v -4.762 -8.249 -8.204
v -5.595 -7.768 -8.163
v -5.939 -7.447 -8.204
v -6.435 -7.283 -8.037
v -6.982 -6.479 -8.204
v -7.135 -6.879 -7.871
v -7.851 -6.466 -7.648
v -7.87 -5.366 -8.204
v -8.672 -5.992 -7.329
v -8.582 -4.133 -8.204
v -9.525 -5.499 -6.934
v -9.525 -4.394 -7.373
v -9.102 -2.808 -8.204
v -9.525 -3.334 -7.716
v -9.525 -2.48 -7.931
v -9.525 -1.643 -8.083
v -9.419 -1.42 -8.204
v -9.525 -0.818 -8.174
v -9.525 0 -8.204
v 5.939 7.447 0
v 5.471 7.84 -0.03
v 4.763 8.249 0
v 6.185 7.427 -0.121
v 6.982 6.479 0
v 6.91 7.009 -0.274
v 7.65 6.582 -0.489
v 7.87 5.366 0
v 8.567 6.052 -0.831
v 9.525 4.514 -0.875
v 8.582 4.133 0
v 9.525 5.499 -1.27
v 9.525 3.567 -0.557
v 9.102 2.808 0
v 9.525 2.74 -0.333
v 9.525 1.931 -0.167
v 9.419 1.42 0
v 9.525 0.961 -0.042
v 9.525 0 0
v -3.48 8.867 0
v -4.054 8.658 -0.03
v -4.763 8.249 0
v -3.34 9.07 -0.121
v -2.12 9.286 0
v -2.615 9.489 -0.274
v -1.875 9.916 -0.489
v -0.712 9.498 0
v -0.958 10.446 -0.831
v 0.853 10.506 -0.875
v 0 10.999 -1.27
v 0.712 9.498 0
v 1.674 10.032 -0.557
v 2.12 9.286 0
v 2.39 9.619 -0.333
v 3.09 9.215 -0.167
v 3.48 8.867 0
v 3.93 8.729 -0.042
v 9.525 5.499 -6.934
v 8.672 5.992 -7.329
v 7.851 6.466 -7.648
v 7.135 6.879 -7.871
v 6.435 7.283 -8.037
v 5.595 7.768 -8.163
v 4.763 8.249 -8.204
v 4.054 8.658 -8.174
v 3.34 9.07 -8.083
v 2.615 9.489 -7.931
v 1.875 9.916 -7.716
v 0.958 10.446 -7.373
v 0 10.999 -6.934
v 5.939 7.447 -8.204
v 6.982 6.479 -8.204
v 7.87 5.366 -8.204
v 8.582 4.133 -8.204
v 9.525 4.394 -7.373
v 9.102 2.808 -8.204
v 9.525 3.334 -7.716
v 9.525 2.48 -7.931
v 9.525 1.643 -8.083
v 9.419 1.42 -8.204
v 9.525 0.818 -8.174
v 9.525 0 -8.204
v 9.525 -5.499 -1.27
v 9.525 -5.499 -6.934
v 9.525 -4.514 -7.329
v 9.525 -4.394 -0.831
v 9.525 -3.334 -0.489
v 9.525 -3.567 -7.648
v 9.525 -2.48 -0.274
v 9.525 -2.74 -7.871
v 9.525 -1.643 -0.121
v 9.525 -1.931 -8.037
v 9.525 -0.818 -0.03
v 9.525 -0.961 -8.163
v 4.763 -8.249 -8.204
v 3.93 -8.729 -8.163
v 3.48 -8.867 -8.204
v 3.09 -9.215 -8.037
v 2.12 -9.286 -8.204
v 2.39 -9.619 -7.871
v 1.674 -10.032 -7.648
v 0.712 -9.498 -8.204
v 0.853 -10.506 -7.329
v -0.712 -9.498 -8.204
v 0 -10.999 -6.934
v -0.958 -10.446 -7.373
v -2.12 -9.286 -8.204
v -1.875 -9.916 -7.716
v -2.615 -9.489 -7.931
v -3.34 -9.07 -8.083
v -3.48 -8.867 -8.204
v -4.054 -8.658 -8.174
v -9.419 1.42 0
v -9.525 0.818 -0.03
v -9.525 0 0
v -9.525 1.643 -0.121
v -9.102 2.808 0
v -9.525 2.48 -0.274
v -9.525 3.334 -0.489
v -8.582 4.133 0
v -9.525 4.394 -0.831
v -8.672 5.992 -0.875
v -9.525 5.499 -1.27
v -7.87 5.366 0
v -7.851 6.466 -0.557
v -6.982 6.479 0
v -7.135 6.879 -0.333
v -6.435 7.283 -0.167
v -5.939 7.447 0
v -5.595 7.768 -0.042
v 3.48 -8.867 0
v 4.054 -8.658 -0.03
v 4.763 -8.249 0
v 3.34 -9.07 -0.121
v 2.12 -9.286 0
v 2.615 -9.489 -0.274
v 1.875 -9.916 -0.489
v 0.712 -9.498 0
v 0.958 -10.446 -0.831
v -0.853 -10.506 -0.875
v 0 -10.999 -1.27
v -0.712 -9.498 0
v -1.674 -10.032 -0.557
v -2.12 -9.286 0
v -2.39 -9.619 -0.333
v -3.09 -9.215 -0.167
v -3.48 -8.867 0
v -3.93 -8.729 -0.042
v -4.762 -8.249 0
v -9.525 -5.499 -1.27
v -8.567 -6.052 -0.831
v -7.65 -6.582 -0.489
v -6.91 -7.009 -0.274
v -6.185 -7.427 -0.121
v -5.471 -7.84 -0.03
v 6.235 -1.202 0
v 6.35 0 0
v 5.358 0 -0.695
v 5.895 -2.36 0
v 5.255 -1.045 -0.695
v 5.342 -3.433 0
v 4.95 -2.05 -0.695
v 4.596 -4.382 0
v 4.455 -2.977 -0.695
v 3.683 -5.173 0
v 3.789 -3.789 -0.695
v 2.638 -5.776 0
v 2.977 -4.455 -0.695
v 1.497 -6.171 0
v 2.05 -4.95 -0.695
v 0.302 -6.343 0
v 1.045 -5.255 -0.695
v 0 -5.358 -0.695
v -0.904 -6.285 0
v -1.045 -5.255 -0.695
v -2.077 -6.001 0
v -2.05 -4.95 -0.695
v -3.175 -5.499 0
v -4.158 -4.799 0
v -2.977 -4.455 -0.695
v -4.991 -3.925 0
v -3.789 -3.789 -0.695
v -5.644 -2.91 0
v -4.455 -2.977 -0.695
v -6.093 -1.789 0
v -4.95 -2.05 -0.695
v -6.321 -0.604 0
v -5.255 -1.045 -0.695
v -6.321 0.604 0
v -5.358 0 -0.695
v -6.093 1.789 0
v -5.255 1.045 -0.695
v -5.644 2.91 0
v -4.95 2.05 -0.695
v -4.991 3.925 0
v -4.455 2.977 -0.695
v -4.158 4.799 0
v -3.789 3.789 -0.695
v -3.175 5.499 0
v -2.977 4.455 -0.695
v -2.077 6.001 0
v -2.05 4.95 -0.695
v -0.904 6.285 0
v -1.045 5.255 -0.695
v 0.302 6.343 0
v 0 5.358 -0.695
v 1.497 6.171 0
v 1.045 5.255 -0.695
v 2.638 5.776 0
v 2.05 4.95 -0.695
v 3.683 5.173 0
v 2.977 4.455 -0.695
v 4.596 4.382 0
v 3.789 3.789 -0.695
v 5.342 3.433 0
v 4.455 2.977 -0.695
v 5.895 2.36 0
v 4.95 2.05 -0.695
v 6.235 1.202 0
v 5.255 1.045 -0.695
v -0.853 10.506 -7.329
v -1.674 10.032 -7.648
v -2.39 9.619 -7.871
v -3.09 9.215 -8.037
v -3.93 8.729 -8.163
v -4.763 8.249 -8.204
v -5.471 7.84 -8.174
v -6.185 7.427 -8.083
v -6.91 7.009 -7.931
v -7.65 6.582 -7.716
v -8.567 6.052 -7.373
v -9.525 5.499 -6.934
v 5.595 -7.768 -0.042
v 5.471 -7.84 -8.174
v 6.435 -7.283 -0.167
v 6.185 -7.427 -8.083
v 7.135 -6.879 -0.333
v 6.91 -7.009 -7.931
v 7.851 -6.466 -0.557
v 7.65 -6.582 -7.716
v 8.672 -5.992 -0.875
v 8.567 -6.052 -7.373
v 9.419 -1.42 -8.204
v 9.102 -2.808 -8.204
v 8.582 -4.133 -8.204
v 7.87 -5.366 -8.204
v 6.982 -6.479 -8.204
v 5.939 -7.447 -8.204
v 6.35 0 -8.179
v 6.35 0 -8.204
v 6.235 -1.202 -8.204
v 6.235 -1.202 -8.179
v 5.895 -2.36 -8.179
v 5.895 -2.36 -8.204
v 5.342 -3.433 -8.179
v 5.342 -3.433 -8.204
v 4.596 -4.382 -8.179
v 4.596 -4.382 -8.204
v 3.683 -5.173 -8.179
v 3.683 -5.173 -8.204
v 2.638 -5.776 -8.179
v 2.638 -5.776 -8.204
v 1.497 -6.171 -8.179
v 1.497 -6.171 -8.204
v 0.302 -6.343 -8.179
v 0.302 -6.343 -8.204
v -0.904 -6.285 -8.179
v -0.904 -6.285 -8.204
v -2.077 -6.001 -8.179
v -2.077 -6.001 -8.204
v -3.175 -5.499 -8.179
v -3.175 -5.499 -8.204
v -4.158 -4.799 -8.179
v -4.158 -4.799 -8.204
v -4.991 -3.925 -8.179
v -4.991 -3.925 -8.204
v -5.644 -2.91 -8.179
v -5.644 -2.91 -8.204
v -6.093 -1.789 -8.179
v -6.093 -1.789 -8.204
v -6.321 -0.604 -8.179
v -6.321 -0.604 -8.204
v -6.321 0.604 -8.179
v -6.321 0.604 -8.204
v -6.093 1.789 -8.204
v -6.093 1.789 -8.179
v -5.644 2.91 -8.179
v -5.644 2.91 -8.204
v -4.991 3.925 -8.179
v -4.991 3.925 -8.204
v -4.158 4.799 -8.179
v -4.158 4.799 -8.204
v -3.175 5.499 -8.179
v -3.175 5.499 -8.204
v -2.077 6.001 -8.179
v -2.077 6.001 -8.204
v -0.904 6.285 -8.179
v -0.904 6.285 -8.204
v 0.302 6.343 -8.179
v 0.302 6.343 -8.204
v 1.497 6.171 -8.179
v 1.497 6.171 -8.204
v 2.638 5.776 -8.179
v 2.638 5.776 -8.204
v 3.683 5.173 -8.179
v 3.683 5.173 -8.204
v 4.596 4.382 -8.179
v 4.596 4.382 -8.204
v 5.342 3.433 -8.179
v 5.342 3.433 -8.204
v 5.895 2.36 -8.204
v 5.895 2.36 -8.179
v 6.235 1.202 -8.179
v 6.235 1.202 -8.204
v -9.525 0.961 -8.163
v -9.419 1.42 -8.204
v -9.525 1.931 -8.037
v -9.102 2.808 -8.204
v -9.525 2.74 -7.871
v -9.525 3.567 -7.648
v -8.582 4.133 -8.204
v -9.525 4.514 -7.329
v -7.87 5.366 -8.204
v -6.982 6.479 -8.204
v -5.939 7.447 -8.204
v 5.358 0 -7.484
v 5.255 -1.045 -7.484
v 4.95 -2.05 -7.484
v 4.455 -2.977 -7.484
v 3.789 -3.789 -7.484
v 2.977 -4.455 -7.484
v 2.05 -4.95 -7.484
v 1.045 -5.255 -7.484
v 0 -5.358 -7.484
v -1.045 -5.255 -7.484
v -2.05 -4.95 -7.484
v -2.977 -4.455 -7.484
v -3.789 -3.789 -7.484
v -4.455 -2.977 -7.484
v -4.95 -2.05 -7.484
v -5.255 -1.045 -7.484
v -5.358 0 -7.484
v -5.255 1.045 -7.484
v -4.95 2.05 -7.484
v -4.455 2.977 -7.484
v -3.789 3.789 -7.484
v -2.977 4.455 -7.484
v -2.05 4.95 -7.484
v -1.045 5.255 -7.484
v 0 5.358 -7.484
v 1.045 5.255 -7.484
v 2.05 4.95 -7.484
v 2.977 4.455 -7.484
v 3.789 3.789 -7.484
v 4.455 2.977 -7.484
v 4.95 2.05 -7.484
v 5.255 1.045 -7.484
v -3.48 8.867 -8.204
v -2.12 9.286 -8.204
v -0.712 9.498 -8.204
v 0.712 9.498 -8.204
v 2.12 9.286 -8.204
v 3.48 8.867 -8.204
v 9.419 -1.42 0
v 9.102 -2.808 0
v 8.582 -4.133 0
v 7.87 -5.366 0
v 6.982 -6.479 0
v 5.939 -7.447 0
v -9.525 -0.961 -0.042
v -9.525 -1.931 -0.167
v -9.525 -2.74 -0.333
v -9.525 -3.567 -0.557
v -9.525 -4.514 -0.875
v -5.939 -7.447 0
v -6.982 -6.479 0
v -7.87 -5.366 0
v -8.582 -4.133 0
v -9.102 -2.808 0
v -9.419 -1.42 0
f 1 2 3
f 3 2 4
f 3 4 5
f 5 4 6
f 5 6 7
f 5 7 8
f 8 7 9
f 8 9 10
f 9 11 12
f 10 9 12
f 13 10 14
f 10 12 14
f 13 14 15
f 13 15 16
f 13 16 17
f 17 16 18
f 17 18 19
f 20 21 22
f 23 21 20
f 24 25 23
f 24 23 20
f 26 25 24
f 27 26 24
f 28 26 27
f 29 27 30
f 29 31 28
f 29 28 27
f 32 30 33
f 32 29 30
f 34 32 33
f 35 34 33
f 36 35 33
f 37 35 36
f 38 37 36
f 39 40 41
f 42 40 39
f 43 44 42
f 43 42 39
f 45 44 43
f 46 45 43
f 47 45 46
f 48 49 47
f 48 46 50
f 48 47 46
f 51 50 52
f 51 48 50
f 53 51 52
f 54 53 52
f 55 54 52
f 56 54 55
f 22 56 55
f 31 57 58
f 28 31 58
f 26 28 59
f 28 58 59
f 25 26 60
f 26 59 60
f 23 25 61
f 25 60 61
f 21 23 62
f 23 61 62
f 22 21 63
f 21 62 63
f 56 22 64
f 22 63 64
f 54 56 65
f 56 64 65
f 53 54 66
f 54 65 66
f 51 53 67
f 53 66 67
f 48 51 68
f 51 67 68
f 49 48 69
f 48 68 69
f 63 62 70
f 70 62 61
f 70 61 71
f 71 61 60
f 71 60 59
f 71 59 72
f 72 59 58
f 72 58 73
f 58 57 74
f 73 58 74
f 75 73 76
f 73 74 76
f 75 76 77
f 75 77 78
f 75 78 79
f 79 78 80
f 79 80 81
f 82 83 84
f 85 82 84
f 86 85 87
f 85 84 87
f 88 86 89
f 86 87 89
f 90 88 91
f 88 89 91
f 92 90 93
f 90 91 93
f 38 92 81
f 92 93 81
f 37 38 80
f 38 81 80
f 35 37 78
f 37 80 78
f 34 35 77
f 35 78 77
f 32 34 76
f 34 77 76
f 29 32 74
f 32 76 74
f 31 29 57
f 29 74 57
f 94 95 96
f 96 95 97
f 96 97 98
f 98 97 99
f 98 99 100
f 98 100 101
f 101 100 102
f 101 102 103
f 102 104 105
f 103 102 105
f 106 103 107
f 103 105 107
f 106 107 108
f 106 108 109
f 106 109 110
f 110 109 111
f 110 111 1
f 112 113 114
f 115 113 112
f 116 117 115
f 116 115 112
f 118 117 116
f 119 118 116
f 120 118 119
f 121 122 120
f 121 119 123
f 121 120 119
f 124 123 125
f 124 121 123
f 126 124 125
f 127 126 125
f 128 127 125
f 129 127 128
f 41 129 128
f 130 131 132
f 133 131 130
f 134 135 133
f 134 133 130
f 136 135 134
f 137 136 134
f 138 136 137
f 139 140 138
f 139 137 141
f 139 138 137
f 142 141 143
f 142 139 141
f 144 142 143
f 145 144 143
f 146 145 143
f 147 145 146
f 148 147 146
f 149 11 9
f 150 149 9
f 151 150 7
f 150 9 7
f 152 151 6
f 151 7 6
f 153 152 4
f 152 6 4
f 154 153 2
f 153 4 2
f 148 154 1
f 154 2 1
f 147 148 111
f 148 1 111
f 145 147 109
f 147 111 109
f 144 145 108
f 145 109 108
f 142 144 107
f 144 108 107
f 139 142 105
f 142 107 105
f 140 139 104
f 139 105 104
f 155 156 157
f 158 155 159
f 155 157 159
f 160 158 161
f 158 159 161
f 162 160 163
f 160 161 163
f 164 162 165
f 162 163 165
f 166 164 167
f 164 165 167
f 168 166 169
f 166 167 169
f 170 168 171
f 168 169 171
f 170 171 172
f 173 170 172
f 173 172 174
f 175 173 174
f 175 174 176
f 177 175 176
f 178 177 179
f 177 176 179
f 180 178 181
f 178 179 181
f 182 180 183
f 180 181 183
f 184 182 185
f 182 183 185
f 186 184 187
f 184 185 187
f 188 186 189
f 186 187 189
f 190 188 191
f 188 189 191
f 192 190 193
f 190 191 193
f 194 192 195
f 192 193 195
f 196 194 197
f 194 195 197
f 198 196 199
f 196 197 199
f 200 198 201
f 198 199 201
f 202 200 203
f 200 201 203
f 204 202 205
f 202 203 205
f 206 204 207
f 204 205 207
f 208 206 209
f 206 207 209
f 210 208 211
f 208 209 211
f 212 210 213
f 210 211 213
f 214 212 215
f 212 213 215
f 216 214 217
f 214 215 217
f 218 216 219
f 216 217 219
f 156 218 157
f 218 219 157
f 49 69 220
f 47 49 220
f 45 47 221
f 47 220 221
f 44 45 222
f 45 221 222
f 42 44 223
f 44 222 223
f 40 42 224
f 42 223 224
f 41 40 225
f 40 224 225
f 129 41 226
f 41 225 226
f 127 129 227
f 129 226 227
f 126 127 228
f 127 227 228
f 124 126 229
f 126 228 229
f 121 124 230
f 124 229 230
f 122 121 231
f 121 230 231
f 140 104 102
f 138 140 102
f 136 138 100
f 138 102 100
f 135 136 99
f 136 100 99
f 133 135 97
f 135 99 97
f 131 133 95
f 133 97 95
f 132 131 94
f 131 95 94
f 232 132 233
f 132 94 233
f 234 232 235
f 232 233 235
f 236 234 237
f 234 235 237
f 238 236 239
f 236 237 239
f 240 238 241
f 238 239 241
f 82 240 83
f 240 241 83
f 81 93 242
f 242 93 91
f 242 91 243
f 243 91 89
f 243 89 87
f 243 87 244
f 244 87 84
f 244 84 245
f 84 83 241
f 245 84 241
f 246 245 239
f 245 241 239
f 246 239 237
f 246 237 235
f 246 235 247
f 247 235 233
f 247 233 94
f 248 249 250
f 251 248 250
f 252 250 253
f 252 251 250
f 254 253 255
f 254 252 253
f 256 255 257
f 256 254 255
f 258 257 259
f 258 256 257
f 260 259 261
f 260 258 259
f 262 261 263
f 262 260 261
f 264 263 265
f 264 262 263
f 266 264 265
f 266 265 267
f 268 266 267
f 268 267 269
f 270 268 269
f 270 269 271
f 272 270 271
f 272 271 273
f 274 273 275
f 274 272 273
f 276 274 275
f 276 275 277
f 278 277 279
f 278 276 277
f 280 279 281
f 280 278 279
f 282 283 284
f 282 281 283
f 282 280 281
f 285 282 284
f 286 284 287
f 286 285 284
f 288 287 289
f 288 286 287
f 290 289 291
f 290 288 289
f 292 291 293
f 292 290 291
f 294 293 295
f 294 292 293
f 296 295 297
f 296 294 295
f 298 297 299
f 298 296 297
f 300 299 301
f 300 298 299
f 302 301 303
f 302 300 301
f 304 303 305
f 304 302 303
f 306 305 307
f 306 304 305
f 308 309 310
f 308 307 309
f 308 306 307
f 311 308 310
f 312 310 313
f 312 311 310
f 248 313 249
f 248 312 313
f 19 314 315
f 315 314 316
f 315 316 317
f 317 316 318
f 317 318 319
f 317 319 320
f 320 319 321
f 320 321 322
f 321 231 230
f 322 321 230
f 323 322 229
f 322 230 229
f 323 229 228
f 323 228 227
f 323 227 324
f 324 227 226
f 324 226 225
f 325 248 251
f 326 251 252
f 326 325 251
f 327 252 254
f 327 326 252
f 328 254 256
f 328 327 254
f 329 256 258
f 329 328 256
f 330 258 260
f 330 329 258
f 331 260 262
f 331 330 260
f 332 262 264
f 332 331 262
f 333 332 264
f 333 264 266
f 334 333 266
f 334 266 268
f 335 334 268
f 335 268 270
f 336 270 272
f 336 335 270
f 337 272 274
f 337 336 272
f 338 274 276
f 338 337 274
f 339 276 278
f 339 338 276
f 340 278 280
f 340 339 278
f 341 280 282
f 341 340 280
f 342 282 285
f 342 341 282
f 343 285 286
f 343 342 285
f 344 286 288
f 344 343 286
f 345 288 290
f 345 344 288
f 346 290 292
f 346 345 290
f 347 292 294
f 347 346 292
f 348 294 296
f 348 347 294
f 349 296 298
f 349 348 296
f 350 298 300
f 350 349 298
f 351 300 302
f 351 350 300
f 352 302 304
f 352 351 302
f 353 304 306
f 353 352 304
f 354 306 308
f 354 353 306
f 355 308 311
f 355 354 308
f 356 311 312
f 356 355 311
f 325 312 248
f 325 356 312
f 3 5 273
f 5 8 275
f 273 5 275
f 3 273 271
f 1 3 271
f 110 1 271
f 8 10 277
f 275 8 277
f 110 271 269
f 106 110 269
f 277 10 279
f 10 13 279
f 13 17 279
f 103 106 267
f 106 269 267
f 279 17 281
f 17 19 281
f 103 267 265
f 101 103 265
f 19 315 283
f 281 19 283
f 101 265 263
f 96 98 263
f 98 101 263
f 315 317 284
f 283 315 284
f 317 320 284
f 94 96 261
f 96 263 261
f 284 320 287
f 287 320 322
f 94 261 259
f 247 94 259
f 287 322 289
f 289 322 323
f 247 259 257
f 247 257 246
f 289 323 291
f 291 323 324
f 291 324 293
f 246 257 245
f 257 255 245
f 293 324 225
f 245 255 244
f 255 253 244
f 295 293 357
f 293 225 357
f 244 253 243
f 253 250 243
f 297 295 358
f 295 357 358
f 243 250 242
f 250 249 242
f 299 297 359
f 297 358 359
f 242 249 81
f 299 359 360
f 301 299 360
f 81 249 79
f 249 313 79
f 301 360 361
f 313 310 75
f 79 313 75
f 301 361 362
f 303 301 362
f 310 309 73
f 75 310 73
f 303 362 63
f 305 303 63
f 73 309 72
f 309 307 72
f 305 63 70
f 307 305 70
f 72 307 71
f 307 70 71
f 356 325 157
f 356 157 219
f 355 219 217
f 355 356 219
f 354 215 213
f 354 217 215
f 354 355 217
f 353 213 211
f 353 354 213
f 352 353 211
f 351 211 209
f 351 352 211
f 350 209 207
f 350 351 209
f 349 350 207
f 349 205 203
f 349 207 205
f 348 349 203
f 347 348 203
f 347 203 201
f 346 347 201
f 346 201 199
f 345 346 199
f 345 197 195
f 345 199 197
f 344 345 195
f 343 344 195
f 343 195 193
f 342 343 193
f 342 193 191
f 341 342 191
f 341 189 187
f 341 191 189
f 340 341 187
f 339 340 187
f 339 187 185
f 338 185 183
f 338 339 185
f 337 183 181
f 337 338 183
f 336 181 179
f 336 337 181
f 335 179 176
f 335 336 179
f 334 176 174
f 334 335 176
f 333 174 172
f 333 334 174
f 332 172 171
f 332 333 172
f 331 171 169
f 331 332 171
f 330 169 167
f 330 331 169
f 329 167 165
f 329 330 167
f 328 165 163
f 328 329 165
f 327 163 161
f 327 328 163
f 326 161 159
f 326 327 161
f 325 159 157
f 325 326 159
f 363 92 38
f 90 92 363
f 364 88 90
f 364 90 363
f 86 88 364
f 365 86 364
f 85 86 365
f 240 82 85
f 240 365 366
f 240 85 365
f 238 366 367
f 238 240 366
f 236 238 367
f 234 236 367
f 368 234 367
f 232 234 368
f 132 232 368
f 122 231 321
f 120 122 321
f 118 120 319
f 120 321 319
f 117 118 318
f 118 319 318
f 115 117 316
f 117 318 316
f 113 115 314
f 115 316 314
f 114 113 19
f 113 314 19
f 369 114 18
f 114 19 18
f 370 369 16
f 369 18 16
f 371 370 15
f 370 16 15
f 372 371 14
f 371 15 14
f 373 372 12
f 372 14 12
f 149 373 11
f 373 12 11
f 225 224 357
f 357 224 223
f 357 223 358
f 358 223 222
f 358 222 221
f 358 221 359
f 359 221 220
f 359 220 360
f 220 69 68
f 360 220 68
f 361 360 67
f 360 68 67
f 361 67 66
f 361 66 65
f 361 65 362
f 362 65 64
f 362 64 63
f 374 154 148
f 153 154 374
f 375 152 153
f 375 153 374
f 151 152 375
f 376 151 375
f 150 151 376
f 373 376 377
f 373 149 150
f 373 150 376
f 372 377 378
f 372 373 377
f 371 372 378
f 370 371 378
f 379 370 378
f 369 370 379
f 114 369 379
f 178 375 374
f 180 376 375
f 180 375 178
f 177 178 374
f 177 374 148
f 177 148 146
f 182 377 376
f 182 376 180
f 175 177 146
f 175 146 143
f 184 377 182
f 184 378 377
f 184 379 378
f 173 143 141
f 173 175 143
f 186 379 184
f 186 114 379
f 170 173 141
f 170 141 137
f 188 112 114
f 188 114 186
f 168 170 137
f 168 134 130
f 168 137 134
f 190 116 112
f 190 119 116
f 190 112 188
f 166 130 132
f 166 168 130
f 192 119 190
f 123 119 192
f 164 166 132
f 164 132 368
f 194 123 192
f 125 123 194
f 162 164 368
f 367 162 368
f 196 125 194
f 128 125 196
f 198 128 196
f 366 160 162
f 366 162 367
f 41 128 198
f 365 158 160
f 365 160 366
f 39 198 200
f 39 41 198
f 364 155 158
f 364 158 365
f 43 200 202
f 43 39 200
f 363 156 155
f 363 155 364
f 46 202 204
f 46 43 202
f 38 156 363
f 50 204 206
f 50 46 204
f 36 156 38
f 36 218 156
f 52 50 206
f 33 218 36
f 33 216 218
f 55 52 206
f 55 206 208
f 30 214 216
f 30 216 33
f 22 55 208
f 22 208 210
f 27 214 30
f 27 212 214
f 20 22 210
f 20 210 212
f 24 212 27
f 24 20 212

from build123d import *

# Parameters (mm, degrees)
THREADSCHEMATIC_START     = -8.2042
THREADSCHEMATIC_OUTLINE_R = 5.35813
THREADSCHEMATIC_DEPTH     = 8.2042


# Read off the part's stored shape, not the designer's step: ThreadSchematic
with BuildPart() as part:
    # ThreadSchematic outline → ThreadSchematic (new body)
    with BuildSketch(Plane.XY.offset(THREADSCHEMATIC_START)):
        Polygon((9.525, 5.499261314), (0, 10.998522628), (-9.525, 5.499261314), (-9.525, -5.499261314), (0, -10.998522628), (9.525, -5.499261314), align=None)
        Circle(THREADSCHEMATIC_OUTLINE_R, mode=Mode.SUBTRACT)
    extrude(amount=THREADSCHEMATIC_DEPTH)

    # Sketch3 → Double-Chamfer (revolve, cut)
    with BuildSketch(Plane(origin=(0, 0, 0), x_dir=(0, 0, -1), z_dir=(1, 0, 0))):
        Polygon((8.2042, 9.525), (6.9342, 10.998522628), (6.9342, 23.698522628), (20.9042, 23.698522628), (20.9042, 9.525), align=None)
        Polygon((1.27, 23.698522628), (-12.7, 23.698522628), (-12.7, 9.525), (0, 9.525), (1.27, 10.998522628), align=None)
    revolve(axis=Axis((0, 0, 0), (0, 0, -1)), mode=Mode.SUBTRACT)

    # EndChamferSke → EndChamfer (revolve, cut)
    with BuildSketch(Plane(origin=(0, 0, 0), x_dir=(0, 0, -1), z_dir=(1, 0, 0)), mode=Mode.PRIVATE) as endchamfer_sk:
        Polygon((8.1788, 6.35), (7.414833664, 5.258943), (8.2296, 5.258943), (8.2296, 6.35), align=None)
        Polygon((-0.0508, 6.35), (0, 6.35), (0.763966336, 5.258943), (-0.0508, 5.258943), align=None)
    revolve(endchamfer_sk.sketch.rotate(Axis((0, 0, -25.037505729), (0, 0, -1)), 90), axis=Axis((0, 0, -25.037505729), (0, 0, -1)), mode=Mode.SUBTRACT)


solid = part.part
